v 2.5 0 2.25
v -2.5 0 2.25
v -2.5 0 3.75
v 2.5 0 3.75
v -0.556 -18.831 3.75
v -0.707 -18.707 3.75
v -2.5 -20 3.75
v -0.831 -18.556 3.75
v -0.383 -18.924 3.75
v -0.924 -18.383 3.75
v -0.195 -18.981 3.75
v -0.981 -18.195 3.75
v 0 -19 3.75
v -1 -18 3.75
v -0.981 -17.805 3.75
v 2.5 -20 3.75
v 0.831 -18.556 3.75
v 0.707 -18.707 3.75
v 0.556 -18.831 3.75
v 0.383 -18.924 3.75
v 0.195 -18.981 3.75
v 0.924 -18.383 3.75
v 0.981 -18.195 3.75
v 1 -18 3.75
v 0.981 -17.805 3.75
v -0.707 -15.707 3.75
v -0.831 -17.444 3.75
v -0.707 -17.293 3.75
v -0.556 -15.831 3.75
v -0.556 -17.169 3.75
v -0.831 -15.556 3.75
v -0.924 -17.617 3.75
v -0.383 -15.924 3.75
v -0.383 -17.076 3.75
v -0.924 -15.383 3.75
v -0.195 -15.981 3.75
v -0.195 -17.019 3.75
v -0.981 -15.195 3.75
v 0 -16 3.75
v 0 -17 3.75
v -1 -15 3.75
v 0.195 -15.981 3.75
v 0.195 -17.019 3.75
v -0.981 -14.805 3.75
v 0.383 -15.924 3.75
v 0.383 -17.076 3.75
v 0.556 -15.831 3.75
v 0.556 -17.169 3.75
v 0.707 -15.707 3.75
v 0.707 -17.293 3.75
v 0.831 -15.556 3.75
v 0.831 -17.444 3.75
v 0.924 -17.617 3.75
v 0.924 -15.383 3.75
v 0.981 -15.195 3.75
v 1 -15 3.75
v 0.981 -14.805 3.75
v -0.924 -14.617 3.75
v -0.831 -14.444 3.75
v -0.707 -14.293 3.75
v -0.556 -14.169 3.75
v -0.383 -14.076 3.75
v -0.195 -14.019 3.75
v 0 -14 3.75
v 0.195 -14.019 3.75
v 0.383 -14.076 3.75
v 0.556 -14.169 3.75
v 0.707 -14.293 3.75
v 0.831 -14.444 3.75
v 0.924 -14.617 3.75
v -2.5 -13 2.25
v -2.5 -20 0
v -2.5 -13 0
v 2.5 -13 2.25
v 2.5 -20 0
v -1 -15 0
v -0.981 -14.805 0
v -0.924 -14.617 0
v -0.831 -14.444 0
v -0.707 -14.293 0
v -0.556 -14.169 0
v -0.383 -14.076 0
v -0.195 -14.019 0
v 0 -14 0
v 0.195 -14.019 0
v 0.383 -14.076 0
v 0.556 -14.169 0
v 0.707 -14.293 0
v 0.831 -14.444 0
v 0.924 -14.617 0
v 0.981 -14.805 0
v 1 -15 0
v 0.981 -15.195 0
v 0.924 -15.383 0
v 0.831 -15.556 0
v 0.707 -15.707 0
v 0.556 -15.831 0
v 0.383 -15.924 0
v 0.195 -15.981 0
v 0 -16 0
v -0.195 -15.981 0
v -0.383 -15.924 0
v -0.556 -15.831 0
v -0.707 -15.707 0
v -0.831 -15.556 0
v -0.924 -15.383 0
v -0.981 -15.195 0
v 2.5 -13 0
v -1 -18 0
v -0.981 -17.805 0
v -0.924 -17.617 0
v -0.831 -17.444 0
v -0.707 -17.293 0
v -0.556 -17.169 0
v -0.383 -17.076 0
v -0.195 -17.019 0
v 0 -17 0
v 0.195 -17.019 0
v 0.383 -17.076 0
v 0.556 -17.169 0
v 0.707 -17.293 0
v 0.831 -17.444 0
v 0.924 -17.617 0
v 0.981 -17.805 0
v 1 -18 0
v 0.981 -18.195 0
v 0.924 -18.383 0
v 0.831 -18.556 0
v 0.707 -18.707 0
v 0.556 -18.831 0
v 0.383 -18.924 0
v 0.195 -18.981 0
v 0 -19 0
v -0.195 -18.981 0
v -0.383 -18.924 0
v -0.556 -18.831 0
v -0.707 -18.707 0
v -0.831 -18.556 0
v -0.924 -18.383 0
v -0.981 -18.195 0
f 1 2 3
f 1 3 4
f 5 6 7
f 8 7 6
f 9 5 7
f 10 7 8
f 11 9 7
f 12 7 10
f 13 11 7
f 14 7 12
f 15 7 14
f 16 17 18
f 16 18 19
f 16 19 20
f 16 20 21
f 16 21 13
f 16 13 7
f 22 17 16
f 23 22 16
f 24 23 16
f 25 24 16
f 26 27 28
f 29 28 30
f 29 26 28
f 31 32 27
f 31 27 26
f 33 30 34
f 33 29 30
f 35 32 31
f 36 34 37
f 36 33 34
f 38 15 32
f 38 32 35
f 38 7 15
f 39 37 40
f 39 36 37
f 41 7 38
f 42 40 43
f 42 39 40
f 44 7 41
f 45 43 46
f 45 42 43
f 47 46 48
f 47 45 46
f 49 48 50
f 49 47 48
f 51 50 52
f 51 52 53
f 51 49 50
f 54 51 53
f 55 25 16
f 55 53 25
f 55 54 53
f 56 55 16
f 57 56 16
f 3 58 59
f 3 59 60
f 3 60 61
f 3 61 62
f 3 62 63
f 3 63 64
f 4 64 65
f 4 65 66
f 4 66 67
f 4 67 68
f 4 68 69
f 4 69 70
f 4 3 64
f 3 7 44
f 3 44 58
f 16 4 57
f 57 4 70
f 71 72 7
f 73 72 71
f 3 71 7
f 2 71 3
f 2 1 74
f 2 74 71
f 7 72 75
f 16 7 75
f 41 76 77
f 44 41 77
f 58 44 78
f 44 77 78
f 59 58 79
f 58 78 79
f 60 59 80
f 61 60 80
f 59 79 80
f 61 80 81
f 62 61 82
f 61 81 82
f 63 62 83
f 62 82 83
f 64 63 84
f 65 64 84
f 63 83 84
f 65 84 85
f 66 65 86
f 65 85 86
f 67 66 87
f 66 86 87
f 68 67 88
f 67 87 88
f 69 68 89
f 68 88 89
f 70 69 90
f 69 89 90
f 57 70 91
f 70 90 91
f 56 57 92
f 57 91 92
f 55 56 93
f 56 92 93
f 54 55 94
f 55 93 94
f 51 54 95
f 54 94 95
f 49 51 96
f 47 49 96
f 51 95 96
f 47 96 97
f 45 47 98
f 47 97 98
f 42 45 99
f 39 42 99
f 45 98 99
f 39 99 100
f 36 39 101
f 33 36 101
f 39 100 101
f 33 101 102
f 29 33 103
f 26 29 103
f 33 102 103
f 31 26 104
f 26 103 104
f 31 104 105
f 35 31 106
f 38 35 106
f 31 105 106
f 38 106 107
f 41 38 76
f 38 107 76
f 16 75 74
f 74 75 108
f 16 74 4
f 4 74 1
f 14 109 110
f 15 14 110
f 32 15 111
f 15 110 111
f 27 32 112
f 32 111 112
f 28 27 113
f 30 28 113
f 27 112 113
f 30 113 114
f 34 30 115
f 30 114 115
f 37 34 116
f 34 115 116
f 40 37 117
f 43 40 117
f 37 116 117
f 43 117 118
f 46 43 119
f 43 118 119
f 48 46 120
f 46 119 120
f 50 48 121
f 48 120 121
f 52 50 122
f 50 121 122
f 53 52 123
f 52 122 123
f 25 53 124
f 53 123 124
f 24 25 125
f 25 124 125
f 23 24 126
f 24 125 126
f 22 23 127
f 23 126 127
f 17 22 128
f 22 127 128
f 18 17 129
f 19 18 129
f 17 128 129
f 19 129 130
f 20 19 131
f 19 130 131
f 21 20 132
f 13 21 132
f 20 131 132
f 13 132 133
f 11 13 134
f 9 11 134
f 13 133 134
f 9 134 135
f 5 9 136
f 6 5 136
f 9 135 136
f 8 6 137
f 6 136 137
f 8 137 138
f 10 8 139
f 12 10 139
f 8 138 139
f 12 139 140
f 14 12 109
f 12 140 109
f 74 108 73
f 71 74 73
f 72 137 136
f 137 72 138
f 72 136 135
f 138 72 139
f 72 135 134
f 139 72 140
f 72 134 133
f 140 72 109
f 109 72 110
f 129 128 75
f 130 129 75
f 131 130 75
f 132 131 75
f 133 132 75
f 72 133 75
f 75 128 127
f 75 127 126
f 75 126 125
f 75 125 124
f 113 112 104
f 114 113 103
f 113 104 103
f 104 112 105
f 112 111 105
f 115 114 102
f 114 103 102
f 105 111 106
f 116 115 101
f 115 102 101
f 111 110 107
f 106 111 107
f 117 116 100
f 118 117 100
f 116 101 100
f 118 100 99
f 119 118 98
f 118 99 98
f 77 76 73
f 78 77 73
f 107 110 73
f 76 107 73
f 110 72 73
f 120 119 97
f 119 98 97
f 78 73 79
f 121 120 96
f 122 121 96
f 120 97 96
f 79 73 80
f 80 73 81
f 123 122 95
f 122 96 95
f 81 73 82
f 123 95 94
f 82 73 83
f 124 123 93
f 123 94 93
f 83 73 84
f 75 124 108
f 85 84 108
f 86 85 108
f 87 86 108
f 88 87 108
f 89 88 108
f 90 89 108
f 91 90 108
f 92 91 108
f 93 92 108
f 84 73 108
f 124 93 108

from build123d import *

# Parameters (mm, degrees)
SKETCH2_W      = 5
SKETCH2_H      = 20
EXTRUDE1_DEPTH = 3.75
SKETCH3_W      = 5
SKETCH3_H      = 13
EXTRUDE2_DEPTH = 2.25
SKETCH4_R      = 1
EXTRUDE3_DEPTH = 3.75


with BuildPart() as part:
    # Sketch2 → Extrude1 (new body)
    with BuildSketch(Plane.XY):
        with Locations((0, -10)):
            Rectangle(SKETCH2_W, SKETCH2_H)
    extrude(amount=EXTRUDE1_DEPTH)

    # Sketch3 → Extrude2 (cut)
    with BuildSketch(Plane(origin=(0, 0, 0), x_dir=(-1, 0, 0), z_dir=(0, 0, -1))):
        with Locations((0, -6.5)):
            Rectangle(SKETCH3_W, SKETCH3_H)
    extrude(amount=-EXTRUDE2_DEPTH, mode=Mode.SUBTRACT)

    # Sketch4 → Extrude3 (cut)
    with BuildSketch(Plane(origin=(0, 0, 0), x_dir=(-1, 0, 0), z_dir=(0, 0, -1))):
        with Locations((0, -18)):
            Circle(SKETCH4_R)
        with Locations((0, -15)):
            Circle(SKETCH4_R)
    extrude(amount=-EXTRUDE3_DEPTH, mode=Mode.SUBTRACT)


solid = part.part
